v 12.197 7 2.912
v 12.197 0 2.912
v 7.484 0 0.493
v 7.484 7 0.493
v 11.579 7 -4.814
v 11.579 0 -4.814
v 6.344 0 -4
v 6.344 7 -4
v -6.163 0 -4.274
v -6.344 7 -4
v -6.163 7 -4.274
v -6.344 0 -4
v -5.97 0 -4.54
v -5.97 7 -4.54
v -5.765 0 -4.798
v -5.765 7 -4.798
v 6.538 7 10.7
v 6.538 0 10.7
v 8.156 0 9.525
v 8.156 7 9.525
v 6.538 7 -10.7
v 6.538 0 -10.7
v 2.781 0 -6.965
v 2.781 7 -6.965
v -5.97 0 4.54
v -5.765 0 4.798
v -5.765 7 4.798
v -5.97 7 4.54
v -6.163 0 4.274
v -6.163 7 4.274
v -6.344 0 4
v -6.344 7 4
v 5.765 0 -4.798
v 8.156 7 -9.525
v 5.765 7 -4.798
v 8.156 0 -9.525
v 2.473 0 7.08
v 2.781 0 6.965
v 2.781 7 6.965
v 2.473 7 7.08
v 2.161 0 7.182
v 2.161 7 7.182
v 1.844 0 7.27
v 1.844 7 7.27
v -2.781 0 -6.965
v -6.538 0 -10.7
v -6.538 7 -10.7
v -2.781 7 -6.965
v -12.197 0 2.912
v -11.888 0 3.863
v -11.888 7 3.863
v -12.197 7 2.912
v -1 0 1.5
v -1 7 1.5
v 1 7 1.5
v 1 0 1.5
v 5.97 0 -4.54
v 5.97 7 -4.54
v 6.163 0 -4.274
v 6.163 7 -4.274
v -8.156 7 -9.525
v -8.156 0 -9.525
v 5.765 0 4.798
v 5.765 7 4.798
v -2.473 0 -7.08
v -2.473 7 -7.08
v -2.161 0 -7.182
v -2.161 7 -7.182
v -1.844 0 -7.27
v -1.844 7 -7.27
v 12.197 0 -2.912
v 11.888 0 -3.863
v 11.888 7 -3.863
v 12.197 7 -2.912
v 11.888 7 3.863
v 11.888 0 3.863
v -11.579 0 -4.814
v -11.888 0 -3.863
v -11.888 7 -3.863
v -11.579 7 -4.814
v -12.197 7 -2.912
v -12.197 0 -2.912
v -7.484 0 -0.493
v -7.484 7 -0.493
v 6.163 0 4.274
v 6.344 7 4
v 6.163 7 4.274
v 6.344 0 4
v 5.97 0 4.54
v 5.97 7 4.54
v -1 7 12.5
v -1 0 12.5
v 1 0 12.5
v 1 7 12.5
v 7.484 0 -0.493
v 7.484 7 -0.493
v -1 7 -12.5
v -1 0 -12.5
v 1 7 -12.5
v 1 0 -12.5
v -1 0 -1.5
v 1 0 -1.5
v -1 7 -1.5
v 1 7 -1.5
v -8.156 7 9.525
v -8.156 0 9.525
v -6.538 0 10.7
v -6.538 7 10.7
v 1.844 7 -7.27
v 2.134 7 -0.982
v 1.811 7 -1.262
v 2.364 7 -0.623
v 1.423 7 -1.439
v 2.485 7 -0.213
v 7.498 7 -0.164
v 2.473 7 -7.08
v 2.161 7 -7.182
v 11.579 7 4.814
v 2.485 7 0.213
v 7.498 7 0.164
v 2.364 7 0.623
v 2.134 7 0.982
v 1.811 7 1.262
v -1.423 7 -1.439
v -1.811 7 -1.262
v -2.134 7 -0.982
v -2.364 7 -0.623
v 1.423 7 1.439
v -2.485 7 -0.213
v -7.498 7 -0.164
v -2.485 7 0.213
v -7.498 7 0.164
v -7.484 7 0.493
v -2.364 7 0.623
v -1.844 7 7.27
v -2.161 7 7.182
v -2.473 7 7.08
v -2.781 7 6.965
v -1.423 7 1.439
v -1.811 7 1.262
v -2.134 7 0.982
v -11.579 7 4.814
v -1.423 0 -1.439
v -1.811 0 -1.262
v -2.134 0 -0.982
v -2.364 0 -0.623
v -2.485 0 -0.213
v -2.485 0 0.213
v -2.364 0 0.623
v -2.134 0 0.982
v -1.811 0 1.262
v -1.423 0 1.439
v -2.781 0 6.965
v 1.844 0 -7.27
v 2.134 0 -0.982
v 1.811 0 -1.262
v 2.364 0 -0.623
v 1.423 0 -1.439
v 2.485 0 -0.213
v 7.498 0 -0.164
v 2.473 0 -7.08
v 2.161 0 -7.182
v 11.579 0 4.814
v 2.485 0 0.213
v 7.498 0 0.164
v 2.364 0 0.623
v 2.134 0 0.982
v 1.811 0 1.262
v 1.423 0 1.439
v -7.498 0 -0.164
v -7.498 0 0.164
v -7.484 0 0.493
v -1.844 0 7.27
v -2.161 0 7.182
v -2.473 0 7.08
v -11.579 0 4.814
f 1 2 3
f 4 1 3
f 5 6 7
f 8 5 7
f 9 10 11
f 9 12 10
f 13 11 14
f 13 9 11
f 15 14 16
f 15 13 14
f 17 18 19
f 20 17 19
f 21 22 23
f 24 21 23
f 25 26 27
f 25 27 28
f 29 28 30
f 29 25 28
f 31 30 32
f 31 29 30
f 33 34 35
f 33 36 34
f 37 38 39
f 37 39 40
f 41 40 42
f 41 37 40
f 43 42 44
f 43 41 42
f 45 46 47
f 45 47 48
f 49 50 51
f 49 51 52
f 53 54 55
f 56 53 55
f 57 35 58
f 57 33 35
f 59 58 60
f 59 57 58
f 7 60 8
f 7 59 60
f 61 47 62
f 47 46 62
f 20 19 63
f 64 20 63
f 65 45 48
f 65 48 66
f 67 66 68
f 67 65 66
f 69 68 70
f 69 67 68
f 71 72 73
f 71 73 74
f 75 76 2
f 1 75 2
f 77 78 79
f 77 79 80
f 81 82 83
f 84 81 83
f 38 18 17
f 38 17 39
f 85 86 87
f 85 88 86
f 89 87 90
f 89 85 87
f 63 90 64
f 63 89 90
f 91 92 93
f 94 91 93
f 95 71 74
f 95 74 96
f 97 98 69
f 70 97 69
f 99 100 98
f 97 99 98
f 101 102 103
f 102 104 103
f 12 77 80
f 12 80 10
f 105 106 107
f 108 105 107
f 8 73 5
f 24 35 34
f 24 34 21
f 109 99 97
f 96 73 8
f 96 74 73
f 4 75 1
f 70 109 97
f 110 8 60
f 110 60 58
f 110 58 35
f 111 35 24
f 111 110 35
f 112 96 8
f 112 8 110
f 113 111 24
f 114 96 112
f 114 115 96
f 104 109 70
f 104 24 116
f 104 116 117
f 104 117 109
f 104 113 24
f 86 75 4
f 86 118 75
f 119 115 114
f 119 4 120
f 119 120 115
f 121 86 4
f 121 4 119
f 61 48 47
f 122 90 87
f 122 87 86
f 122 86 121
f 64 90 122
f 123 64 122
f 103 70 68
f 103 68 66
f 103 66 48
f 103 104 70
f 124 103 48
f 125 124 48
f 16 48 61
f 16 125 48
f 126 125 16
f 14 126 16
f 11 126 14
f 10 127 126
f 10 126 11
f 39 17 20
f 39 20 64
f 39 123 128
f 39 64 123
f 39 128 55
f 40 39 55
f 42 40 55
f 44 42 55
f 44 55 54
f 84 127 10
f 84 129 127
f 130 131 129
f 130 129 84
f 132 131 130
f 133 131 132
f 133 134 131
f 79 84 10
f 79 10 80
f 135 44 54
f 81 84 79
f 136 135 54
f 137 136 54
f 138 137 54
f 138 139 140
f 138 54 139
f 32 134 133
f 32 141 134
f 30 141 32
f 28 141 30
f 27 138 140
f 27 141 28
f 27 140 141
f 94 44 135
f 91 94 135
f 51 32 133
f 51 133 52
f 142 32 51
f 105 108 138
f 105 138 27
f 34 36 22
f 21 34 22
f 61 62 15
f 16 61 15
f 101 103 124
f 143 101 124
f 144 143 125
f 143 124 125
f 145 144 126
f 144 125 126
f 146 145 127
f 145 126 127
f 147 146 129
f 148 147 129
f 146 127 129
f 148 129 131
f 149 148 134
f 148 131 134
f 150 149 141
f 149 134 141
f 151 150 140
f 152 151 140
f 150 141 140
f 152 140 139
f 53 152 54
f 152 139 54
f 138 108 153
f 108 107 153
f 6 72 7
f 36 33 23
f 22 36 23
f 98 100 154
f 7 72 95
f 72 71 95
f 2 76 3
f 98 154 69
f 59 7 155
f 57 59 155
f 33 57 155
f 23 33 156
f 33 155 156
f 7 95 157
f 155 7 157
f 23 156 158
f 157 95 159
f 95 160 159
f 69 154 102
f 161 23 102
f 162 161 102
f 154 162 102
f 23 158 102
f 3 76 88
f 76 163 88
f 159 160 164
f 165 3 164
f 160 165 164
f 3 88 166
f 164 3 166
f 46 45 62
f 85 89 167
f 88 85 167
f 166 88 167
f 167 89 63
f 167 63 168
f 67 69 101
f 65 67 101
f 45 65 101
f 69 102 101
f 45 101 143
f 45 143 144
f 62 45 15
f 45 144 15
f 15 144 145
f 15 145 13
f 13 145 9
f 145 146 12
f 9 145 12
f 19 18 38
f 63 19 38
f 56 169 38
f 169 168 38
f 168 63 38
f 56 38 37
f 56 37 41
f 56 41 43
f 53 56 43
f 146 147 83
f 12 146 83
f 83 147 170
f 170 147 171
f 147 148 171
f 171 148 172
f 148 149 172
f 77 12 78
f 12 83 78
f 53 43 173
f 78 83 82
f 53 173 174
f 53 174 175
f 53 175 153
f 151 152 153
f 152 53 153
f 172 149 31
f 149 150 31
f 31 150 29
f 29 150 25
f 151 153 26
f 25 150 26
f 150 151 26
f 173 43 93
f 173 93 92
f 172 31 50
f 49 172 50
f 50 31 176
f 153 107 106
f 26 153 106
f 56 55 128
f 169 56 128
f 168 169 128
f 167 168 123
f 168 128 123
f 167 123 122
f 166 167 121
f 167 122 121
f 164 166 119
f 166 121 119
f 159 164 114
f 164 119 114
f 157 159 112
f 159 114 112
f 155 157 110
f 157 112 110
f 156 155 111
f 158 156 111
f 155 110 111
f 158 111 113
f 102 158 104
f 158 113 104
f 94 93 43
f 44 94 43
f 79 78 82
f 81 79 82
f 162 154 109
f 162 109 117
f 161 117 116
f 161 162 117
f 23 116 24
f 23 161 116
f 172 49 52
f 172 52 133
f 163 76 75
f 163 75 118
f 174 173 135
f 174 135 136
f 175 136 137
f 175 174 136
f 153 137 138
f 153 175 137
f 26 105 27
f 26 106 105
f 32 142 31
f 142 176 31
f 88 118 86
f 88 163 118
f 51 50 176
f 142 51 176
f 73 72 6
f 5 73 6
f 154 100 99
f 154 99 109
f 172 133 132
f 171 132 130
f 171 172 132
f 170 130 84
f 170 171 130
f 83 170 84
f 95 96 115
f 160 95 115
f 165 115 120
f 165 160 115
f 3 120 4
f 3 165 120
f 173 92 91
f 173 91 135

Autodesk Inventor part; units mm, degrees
sketch "Sketch1" plane through (0, 0, 0) normal (0, 1, 0) x (-1, 0, 0)
  circle A0 centre (0, 0) radius 7.5
  dimension "d0" = 15
extrude "Extrusion1" add sketch "Sketch1" along normal blind 7
sketch "Sketch2" plane through (0, 7, 0) normal (0, 1, 0) x (1, 0, 0)
  line L0 (0, 0) -> (2.5, 0)
  line L1 (2.5, 0) -> (-2.5, 0) construction
  line L2 (1, 1.5) -> (-1, 1.5)
  line L3 (-1, -1.5) -> (1, -1.5)
  arc A0 (1, -1.5) -> (1, 1.5) centre (1, 0) ccw
  arc A1 (-1, 1.5) -> (-1, -1.5) centre (-1, 0) ccw
  dimension "d3" = 2.5
  dimension "d4" = 5
  dimension "d5" = 3
extrude "Extrusion2" cut sketch "Sketch2" against normal blind 7
sketch "Sketch3" plane through (0, 0, 0) normal (0, 1, 0) x (-1, 0, 0)
  circle A0 centre (0, 0) radius 7.5 projected
  line L0 (0, 12.5) -> (1, 12.5)
  line L1 (1, 12.5) -> (1.844, 7.2698)
  line L2 (-1, 12.5) -> (-1.844, 7.2698)
  line L3 (0, 12.5) -> (-1, 12.5)
  line L4 (-7.3473, 10.1127) -> (-6.5383, 10.7005)
  line L5 (-7.3473, 10.1127) -> (-8.1563, 9.5249)
  line L6 (-8.1563, 9.5249) -> (-5.7649, 4.7975)
  line L7 (-6.5383, 10.7005) -> (-2.7813, 6.9652)
  line L8 (-11.8882, 3.8627) -> (-11.5792, 4.8138)
  line L9 (-11.8882, 3.8627) -> (-12.1972, 2.9117)
  line L10 (-12.1972, 2.9117) -> (-7.4838, 0.4928)
  line L11 (-11.5792, 4.8138) -> (-6.3442, 4.0002)
  line L12 (-11.8882, -3.8627) -> (-12.1972, -2.9117)
  line L13 (-11.8882, -3.8627) -> (-11.5792, -4.8138)
  line L14 (-11.5792, -4.8138) -> (-6.3442, -4.0002)
  line L15 (-12.1972, -2.9117) -> (-7.4838, -0.4928)
  line L16 (-7.3473, -10.1127) -> (-8.1563, -9.5249)
  line L17 (-7.3473, -10.1127) -> (-6.5383, -10.7005)
  line L18 (-6.5383, -10.7005) -> (-2.7813, -6.9652)
  line L19 (-8.1563, -9.5249) -> (-5.7649, -4.7975)
  line L20 (0, -12.5) -> (-1, -12.5)
  line L21 (0, -12.5) -> (1, -12.5)
  line L22 (1, -12.5) -> (1.844, -7.2698)
  line L23 (-1, -12.5) -> (-1.844, -7.2698)
  line L24 (7.3473, -10.1127) -> (6.5383, -10.7005)
  line L25 (7.3473, -10.1127) -> (8.1563, -9.5249)
  line L26 (8.1563, -9.5249) -> (5.7649, -4.7975)
  line L27 (6.5383, -10.7005) -> (2.7813, -6.9652)
  line L28 (11.8882, -3.8627) -> (11.5792, -4.8138)
  line L29 (11.8882, -3.8627) -> (12.1972, -2.9117)
  line L30 (12.1972, -2.9117) -> (7.4838, -0.4928)
  line L31 (11.5792, -4.8138) -> (6.3442, -4.0002)
  line L32 (11.8882, 3.8627) -> (12.1972, 2.9117)
  line L33 (11.8882, 3.8627) -> (11.5792, 4.8138)
  line L34 (11.5792, 4.8138) -> (6.3442, 4.0002)
  line L35 (12.1972, 2.9117) -> (7.4838, 0.4928)
  line L36 (7.3473, 10.1127) -> (8.1563, 9.5249)
  line L37 (7.3473, 10.1127) -> (6.5383, 10.7005)
  line L38 (6.5383, 10.7005) -> (2.7813, 6.9652)
  line L39 (8.1563, 9.5249) -> (5.7649, 4.7975)
  dimension "d9" = 1
  dimension "d12" = 360
extrude "Extrusion3" add sketch "Sketch3" along normal blind 7 contours A0 L34 L33 L32 L35 | L30 L29 L28 L31 A0 | A0 L38 L37 L36 L39 | L26 L25 L24 L27 A0 | A0 L2 L3 L0 L1 | L22 L21 L20 L23 A0 | A0 L6 L5 L4 L7 | L18 L17 L16 L19 A0 | A0 L10 L9 L8 L11 | L14 L13 L12 L15 A0
properties part number "zahnrad"
